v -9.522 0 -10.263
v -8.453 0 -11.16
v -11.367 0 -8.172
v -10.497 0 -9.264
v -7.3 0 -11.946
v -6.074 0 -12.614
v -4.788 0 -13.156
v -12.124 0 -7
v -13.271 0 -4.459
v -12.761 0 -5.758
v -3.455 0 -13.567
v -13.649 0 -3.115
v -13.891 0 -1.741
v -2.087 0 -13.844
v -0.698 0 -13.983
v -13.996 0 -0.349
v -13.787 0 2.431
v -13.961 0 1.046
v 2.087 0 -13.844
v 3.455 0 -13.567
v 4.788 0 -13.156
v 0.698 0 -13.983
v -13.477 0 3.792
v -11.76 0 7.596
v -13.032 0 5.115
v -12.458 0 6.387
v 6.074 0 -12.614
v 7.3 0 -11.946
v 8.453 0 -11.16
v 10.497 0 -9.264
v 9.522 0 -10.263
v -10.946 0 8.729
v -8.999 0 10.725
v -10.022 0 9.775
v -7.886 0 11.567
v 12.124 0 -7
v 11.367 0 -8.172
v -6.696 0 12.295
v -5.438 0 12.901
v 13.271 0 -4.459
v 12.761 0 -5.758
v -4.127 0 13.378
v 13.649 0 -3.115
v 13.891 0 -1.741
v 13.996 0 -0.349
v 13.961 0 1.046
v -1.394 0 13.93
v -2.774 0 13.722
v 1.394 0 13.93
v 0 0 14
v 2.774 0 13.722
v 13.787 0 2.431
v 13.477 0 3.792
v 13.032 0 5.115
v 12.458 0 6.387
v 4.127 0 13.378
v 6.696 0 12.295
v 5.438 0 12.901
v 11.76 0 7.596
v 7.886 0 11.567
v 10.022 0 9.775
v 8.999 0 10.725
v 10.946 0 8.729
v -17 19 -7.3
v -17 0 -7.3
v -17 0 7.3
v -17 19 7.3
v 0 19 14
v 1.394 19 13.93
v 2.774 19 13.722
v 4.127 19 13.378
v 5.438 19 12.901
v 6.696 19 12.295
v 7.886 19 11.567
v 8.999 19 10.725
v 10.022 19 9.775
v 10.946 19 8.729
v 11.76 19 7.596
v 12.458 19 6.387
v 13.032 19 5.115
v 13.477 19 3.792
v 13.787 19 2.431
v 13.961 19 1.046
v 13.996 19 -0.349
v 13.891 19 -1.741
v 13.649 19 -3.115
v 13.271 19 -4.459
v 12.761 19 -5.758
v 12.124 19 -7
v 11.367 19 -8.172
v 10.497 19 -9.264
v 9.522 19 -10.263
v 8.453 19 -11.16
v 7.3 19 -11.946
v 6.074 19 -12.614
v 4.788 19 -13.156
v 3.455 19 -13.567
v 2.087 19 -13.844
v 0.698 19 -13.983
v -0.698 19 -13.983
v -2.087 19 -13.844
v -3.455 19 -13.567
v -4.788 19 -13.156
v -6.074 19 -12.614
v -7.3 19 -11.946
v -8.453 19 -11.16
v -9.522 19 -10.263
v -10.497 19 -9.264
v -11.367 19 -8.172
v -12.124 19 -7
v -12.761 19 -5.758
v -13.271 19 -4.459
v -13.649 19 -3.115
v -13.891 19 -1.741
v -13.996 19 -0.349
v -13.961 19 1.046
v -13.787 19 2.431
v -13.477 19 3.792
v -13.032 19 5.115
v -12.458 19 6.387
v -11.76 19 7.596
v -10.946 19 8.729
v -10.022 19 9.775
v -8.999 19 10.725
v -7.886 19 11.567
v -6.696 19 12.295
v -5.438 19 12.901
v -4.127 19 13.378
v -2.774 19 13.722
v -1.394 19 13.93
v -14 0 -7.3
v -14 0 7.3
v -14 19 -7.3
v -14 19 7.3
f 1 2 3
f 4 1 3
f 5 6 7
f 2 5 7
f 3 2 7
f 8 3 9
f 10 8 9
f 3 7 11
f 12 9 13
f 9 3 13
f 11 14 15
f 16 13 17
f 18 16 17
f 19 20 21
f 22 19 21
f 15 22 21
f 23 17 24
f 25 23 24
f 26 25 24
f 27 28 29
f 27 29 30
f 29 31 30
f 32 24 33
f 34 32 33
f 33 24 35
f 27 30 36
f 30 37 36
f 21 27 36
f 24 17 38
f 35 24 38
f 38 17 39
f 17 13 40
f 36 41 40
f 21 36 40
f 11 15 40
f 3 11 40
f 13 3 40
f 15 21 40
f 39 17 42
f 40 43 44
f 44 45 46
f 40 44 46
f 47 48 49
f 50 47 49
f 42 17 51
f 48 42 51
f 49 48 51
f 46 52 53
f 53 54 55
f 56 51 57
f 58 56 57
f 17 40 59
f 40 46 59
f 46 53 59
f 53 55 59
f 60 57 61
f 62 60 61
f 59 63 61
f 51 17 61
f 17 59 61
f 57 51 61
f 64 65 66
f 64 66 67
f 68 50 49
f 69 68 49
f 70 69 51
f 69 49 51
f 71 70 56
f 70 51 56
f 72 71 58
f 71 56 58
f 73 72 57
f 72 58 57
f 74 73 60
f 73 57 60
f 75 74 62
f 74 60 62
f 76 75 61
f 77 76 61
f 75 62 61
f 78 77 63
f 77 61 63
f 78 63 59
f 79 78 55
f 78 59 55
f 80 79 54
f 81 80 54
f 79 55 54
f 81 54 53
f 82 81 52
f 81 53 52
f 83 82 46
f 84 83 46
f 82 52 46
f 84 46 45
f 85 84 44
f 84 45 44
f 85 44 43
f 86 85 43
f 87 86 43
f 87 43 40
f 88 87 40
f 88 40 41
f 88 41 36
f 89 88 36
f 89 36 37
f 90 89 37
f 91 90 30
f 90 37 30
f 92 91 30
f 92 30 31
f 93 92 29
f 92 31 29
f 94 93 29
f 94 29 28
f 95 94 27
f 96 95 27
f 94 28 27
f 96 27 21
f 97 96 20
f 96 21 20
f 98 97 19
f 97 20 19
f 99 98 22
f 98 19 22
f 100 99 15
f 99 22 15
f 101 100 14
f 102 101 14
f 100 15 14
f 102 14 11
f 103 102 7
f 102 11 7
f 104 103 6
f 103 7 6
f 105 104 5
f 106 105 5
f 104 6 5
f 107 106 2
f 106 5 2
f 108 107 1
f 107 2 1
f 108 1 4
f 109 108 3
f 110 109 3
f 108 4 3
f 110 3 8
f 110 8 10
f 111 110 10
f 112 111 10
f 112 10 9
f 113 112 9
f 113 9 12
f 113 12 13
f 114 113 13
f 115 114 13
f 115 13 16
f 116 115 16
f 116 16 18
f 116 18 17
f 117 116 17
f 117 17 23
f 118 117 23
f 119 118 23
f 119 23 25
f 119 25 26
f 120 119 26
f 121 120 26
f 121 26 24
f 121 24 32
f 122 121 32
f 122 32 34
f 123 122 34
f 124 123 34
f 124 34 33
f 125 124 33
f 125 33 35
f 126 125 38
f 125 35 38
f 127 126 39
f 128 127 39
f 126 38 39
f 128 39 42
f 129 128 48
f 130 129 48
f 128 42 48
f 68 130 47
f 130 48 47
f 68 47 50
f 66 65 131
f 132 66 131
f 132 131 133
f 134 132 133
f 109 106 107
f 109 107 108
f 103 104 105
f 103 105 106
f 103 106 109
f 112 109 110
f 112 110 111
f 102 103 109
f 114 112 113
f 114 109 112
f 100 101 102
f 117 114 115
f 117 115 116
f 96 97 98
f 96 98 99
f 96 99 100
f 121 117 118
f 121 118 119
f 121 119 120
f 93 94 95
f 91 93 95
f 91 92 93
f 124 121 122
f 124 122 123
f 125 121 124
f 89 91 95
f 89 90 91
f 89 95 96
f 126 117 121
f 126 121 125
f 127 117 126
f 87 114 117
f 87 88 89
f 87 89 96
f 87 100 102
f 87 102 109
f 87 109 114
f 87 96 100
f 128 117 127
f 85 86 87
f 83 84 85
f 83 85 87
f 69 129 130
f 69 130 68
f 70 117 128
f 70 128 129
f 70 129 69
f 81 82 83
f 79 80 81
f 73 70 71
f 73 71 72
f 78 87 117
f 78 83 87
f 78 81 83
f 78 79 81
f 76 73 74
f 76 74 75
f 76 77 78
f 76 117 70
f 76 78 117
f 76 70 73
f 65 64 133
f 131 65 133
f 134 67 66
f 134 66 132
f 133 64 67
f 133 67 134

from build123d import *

# Parameters (mm, degrees)
SKETCH_1_R           = 14
EXTRUDE_1_DEPTH      = 19
EXTRUDE_2_DEPTH      = 7.3
EXTRUDE_2_DEPTH_BACK = 7.3
SKETCH_3_W           = 3
SKETCH_3_H           = 19


with BuildPart() as part:
    # 草图1 → 凸台-拉伸1 (new body)
    with BuildSketch(Plane(origin=(0, 0, 0), x_dir=(1, 0, 0), z_dir=(0, 1, 0))):
        Circle(SKETCH_1_R)
    extrude(amount=EXTRUDE_1_DEPTH)


with BuildPart() as body_2:
    # 草图3 → 凸台-拉伸2 (new, two sides: drawn at the far end of the back side and taken through both)
    with BuildSketch(Plane.XY.offset(-EXTRUDE_2_DEPTH_BACK)):
        with Locations((-15.5, 9.5)):
            Rectangle(SKETCH_3_W, SKETCH_3_H)
    extrude(amount=EXTRUDE_2_DEPTH + EXTRUDE_2_DEPTH_BACK)


solid = Compound([part.part, body_2.part])
